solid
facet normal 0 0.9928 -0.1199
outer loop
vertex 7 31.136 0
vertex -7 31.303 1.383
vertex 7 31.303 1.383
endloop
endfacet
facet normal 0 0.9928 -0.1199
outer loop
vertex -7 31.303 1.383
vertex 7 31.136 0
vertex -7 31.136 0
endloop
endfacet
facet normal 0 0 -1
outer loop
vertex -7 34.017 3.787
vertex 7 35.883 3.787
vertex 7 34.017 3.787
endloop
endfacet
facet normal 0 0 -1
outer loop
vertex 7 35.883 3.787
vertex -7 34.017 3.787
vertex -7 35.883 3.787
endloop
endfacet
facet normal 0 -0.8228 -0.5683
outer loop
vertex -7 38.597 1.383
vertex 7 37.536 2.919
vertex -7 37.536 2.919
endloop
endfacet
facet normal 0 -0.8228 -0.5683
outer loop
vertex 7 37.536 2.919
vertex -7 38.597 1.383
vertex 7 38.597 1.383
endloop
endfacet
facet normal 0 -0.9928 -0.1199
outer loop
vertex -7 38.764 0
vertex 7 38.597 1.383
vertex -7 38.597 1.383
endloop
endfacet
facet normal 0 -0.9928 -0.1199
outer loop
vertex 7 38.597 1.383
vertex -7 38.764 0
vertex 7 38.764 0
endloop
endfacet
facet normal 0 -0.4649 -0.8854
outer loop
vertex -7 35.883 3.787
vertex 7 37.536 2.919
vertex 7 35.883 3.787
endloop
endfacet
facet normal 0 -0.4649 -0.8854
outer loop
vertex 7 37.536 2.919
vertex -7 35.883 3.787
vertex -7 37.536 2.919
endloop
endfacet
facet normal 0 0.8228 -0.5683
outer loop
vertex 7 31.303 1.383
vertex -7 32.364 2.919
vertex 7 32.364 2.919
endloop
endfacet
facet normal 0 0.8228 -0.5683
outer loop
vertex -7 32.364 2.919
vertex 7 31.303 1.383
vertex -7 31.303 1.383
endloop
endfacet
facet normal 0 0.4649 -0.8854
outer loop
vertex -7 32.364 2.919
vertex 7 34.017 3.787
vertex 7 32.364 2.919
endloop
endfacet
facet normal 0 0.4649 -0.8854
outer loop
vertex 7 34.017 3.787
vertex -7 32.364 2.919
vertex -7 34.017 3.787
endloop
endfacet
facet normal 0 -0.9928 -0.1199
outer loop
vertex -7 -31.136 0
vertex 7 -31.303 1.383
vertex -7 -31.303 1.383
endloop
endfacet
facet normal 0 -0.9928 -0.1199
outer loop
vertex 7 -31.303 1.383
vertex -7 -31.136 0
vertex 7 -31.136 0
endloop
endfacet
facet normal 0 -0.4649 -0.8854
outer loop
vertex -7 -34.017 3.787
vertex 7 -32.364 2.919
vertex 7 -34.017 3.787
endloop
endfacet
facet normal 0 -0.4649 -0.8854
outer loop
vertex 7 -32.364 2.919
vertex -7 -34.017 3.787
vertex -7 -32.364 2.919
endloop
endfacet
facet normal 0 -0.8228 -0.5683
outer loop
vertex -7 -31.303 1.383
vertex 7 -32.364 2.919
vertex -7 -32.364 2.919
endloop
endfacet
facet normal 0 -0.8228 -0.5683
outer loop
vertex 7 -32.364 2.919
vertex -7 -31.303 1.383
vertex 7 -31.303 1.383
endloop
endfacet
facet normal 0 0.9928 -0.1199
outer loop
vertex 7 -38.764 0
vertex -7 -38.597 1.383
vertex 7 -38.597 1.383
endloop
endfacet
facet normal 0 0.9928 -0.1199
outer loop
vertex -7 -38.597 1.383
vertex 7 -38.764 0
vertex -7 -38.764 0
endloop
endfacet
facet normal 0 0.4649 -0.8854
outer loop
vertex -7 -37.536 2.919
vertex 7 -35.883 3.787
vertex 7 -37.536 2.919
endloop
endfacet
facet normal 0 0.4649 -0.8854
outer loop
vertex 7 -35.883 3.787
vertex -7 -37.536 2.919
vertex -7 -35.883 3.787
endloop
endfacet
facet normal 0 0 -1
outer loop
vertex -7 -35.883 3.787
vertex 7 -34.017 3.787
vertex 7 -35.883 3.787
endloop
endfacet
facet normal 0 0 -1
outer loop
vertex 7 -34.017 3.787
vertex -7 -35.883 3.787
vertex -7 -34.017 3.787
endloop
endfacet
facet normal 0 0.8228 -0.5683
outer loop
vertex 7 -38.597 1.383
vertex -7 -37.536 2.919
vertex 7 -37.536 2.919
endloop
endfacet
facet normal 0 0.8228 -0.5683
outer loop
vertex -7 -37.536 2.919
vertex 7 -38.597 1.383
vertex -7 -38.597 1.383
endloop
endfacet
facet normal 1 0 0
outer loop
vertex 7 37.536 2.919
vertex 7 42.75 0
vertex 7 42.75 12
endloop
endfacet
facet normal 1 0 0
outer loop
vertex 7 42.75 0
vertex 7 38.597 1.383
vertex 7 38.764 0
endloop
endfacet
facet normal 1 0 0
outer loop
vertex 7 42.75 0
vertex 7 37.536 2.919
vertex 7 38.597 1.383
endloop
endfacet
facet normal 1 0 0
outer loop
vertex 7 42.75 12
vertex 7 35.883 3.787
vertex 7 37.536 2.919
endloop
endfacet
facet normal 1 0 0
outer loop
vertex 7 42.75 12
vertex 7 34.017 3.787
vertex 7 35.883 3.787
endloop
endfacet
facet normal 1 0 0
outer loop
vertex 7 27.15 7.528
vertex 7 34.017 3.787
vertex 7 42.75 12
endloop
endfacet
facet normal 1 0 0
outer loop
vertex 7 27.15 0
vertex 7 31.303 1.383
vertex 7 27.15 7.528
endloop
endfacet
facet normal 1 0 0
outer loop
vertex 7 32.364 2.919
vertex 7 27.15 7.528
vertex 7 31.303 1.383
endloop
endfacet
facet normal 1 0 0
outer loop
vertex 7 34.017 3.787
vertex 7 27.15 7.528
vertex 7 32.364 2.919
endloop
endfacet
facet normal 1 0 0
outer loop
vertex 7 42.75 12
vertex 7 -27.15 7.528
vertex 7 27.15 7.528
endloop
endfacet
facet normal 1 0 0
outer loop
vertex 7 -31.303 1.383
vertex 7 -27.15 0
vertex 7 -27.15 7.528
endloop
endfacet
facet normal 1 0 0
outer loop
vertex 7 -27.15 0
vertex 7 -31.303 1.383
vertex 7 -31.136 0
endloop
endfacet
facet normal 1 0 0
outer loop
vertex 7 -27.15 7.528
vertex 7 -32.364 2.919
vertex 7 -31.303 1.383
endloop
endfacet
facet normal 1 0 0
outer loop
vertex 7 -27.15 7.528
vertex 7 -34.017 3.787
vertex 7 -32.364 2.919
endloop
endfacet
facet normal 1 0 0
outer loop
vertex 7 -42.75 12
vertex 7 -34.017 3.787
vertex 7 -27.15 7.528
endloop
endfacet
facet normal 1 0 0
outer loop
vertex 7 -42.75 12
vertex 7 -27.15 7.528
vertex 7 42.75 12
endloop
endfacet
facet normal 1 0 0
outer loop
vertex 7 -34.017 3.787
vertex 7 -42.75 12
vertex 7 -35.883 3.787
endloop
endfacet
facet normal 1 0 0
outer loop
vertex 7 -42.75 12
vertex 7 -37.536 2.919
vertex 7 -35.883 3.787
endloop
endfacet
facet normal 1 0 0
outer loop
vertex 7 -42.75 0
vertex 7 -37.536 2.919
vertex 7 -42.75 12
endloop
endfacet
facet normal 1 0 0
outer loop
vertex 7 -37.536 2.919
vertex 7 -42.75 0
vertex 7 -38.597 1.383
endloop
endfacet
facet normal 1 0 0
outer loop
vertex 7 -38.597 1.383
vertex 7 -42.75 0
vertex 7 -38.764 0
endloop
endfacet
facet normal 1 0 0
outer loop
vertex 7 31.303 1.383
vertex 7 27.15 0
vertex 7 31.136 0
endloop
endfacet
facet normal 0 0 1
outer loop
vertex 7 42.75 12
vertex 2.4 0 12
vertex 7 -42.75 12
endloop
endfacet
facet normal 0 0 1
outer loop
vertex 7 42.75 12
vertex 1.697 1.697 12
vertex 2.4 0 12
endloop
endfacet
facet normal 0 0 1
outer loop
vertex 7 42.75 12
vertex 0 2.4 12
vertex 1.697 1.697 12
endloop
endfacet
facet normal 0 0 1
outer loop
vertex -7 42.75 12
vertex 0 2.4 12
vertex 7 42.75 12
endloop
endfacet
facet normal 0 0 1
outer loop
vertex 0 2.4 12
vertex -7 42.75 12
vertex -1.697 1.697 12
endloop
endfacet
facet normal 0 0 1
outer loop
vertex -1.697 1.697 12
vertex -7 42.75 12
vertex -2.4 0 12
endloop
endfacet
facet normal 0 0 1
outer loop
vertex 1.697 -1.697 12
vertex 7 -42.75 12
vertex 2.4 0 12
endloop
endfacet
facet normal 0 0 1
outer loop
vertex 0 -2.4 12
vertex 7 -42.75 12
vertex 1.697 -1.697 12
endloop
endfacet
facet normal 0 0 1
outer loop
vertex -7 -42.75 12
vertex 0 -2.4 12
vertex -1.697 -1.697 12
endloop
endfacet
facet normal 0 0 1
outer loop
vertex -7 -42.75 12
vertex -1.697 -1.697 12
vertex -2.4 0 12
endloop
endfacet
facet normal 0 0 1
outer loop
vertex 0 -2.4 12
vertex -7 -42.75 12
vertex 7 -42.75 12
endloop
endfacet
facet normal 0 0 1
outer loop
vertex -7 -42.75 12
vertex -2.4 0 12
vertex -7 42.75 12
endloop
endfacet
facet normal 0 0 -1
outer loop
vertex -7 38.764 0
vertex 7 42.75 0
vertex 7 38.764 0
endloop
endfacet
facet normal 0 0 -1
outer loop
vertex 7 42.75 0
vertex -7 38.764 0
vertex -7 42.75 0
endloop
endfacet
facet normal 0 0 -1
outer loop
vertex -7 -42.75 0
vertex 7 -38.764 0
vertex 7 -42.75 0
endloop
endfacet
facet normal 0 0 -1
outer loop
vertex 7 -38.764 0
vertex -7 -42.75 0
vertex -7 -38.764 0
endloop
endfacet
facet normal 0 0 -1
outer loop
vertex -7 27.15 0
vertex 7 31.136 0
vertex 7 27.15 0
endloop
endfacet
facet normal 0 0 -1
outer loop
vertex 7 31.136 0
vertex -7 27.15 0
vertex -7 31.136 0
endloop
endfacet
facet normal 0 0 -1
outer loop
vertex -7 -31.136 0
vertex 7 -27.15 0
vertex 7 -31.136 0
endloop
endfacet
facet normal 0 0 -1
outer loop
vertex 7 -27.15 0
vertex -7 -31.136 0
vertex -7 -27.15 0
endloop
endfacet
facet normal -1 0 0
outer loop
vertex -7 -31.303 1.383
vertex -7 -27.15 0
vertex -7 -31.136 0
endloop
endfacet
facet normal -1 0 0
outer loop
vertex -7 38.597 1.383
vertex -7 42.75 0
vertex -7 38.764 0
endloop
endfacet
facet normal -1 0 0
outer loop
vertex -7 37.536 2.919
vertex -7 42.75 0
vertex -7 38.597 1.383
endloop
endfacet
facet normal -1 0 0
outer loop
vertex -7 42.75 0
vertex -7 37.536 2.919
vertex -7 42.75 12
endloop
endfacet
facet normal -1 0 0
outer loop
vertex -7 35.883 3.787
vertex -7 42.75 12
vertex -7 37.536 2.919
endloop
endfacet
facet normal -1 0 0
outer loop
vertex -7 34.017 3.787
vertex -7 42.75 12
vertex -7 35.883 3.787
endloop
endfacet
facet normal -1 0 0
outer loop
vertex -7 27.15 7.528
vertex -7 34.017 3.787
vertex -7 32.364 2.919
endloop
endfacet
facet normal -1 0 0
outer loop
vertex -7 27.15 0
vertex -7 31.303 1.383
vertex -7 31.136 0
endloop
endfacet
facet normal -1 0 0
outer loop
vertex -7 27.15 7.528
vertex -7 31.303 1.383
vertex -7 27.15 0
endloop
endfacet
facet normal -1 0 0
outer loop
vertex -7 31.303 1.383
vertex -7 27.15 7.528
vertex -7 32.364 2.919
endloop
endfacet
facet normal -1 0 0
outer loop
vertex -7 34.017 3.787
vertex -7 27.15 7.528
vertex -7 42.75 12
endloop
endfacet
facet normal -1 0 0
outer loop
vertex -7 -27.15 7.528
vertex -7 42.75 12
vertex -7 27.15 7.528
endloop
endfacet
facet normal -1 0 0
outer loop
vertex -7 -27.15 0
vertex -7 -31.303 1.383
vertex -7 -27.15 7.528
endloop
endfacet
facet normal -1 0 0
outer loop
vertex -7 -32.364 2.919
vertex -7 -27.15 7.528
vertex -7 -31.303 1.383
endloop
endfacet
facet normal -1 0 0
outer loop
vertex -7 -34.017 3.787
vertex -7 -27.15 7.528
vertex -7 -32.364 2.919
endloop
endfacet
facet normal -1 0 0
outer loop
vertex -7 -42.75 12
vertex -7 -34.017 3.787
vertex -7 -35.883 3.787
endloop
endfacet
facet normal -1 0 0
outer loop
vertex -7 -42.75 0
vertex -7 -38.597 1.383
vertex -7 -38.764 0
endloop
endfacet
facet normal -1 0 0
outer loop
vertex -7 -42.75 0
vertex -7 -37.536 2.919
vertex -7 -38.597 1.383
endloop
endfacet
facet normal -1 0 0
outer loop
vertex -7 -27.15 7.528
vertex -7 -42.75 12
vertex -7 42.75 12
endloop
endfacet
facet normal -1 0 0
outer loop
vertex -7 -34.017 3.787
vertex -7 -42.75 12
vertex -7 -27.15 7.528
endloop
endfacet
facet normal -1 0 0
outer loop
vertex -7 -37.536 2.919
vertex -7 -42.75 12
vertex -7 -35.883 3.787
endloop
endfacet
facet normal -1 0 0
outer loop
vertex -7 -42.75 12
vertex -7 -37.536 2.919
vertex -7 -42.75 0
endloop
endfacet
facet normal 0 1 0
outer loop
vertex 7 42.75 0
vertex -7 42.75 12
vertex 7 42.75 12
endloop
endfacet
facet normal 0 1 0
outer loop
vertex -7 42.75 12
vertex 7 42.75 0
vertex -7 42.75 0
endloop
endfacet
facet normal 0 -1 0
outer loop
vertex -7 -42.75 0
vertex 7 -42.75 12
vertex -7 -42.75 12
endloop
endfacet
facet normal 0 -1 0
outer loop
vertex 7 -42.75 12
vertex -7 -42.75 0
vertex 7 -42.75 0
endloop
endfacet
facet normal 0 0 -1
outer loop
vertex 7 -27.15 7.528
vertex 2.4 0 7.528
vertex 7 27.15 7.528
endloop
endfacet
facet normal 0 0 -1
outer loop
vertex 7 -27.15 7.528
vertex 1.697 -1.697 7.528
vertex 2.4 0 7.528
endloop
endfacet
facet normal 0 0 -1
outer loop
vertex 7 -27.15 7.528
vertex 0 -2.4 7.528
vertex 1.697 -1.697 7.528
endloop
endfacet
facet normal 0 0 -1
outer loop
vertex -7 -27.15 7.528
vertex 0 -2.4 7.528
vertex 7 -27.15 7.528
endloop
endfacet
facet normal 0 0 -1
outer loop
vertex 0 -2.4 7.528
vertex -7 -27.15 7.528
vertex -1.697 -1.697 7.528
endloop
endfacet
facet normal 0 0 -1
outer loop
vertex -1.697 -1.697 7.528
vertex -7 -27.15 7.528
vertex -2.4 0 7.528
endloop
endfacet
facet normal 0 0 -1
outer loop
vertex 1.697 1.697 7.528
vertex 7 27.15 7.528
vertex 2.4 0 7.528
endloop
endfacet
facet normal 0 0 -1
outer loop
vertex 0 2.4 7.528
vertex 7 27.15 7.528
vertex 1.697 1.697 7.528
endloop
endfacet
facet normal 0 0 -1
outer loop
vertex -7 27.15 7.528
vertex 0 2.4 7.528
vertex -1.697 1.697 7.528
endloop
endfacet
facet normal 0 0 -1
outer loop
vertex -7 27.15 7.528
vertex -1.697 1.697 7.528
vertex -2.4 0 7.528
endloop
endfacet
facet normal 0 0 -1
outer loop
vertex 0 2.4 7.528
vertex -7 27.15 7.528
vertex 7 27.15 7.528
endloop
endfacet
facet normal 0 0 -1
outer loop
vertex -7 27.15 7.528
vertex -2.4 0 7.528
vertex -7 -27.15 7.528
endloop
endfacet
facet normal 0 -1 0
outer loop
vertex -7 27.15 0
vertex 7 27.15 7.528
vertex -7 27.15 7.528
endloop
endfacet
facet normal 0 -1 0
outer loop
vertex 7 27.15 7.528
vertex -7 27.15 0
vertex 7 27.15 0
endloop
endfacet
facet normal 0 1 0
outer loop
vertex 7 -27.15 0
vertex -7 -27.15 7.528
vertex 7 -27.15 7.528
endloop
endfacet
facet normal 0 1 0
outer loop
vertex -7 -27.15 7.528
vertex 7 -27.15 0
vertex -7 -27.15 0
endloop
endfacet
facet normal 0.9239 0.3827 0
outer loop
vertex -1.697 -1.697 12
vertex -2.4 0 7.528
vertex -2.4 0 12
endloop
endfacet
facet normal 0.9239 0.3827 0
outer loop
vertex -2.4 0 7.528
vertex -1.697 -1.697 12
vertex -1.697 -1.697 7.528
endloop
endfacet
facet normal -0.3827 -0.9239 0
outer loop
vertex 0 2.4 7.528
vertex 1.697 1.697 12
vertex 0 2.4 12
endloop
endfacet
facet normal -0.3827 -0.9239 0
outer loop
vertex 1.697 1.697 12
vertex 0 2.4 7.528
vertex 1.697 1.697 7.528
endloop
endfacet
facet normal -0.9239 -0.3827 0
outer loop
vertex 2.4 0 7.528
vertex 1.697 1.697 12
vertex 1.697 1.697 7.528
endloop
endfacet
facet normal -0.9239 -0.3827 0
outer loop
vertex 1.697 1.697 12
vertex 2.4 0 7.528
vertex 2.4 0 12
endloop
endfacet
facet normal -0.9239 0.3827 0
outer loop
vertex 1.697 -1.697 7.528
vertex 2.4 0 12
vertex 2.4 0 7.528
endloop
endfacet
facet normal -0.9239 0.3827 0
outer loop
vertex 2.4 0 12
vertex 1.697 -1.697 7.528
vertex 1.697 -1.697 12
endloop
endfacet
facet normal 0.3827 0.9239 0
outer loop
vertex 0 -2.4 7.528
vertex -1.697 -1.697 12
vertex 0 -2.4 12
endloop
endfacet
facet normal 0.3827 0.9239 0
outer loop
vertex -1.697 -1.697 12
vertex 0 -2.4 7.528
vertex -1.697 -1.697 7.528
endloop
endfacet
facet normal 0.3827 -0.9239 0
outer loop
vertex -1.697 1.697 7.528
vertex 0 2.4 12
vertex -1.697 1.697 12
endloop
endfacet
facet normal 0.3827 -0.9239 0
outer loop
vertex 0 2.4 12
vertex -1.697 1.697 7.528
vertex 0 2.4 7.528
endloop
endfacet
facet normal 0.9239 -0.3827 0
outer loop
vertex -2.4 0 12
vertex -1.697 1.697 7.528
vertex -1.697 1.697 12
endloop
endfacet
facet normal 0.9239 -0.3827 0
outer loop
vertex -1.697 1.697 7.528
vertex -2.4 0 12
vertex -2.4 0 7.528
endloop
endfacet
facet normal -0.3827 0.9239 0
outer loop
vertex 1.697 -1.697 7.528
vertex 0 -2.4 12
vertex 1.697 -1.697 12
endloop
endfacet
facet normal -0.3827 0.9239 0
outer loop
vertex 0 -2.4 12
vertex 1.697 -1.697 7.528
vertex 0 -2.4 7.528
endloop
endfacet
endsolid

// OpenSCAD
//Stand for Depth Guage
//Ari M. Diacou
//Created Jan 16, 2016
//Shared under Creative Commons License: Attribution-ShareAlike 3.0 Unported (CC BY-SA 3.0) 
//see http://creativecommons.org/licenses/by-sa/3.0/


//Measure the widest part of the base of your depth guage.
depth_guage_width = 52.8;
//Measure the base of your depth guage in a direction perpendicular to the distance measured above.
depth_guage_length = 7;
//How much could the depth guage be recessed into the block (and still lie flat)?
depth_guage_depth = 4.2;
//By what height does the bridge have to clear the belt above the top of the rails?
clearance=3.4;
//How high should this block be?
block_height = 12;
//What is the diameter of your depth guage pin (plus a tolerance)?
hole_diameter = 4.8;
//Measure the distance between your rails.
inner_rail_distance = 62.1;
//Measure the distance between the outsides of your rails.
outer_rail_distance = 77.7;

// preview[view:south east, tilt:top]

/* [Hidden] */
//////////////// Derived Parameters ////////////////////////
rail_diameter=(outer_rail_distance-inner_rail_distance)/2;
ep=0+0.05; //epsilon, a small number, used for overlaps
block=[depth_guage_length*2, outer_rail_distance+rail_diameter, block_height];
inner_height=rms([block_height,clearance+depth_guage_depth+rail_diameter/2,clearance+depth_guage_length/2+rail_diameter/2])-rms([depth_guage_length/2,depth_guage_depth]);
//Tries to make an estimate of the thickenss of the "bridge". Should be thick enough that the bridge will not bend while taking readings.
echo(str("block height = ",block_height));
echo(str("inner height = ",inner_height));


cutout=[block[0]+2*ep,inner_rail_distance-rail_diameter,inner_height];

////////////////////// Main() /////////////////////////////
type1();
//////////////////// Functions ////////////////////////////
function rms(list)=norm(list)/sqrt(len(list));
module centered_cube(block){
    translate(-0.5*block+[0,0,.5*block[2]])
        cube(block);
    }
module type1(){
    difference(){
        outer();
        rails();
        inner();
        hole();
        }
    }
module outer(){
    centered_cube(block);
    }
    
module inner(){
    translate([0,0,-ep])
        centered_cube(cutout);
    }

module rails(){
    dist=[0,inner_rail_distance/2+rail_diameter/2,0];
    rotate([0,90,0])
        translate(dist)
            cylinder(d=rail_diameter,h=block[0]+ep, center=true);
    rotate([0,90,0])
        translate(-dist)
            cylinder(d=rail_diameter,h=block[0]+ep, center=true);
    }
module hole(){
    cylinder(h=block[2]+ep,d=hole_diameter);
    }
module recess(){
    
    }
